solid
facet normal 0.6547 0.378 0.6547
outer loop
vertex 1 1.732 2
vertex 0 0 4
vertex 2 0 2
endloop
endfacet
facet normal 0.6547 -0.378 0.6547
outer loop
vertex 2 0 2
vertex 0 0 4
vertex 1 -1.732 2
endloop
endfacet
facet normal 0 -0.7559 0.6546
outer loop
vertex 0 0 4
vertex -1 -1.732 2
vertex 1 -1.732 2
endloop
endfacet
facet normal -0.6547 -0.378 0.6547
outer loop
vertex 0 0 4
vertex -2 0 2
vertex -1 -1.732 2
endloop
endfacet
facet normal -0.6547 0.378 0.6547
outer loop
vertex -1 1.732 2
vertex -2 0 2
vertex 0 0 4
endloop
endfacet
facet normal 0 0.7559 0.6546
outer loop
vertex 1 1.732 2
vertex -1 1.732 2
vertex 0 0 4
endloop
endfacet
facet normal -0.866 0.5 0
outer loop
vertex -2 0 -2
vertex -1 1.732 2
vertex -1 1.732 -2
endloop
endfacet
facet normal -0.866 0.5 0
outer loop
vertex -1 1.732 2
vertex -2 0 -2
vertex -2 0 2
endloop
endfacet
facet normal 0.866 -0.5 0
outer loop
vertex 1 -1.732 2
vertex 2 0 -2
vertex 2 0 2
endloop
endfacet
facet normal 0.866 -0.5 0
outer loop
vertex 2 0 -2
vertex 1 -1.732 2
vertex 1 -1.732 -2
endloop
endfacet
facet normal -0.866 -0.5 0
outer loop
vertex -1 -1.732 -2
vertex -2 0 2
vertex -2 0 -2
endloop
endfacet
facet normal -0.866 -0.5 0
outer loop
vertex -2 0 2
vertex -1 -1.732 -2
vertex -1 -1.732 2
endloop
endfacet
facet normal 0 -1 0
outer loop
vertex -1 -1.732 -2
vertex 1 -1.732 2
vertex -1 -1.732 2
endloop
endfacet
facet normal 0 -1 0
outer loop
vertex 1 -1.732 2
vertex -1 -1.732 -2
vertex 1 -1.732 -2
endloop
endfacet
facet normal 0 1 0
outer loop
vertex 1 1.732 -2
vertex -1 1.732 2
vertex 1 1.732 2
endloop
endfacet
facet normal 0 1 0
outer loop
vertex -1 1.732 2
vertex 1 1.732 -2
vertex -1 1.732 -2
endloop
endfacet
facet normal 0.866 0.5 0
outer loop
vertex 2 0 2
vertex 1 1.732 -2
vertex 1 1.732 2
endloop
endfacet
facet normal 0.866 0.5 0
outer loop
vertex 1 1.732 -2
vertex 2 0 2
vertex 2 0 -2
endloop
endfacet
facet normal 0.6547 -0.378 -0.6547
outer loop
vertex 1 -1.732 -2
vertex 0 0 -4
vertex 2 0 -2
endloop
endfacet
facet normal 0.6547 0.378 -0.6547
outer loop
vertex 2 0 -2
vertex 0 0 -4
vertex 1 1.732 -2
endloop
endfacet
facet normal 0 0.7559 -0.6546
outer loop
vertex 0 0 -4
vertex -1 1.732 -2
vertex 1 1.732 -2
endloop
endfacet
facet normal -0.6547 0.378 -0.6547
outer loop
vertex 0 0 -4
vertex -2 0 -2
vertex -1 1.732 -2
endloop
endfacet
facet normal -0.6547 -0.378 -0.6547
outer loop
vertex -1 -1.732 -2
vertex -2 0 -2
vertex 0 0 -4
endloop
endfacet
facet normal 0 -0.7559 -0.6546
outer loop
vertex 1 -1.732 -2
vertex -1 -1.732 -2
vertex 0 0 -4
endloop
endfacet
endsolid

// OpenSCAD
/*
Modular prism with fake blur. Very fake blur. Extremely fake blur.
*/

prism_sides=6;
base_radius=1;
prism_height=2;
tips_height=1;
prism_twist=0;
prism_color=[0,0.5,1];
// Detail of curved surfaces: 1 face per corner
$fa=1;

module regular_polygon(order=4, r=1){
  angles=[ for (i = [0:order-1]) i*(360/order) ];
  coords=[ for (th=angles) [r*cos(th), r*sin(th)] ];
  polygon(coords);
}

module prism(fake_blur=false) {
  color(prism_color)
  render(convexity=10){
    // Top tip
    rotate([0,0,-prism_twist])
    translate([0,0,prism_height/2])
    linear_extrude(height=tips_height,center=false,convexity=0,twist=prism_twist*(tips_height/prism_height),slices=100,scale=0)
    regular_polygon(order=prism_sides, r=base_radius);

    // Prism
    if (prism_height > 0){
      linear_extrude(height=prism_height,center=true,convexity=0,twist=prism_twist,slices=100,scale=1)
      regular_polygon(order=prism_sides, r=base_radius);
    }

    // Bottom tip
    translate([0,0,-prism_height/2]) rotate([180,0,0])
    linear_extrude(height=tips_height,center=false,convexity=0,twist=prism_twist*(tips_height/prism_height),slices=100,scale=0)
    regular_polygon(order=prism_sides, r=base_radius);
  }
  
  // Extremely fake blur
  if (fake_blur==true) {
    for(index = [1:1:10]) {
      color(prism_color, alpha=0.040-index/1000) scale([index/10+1,index/10+1,index/10+1]) prism(fake_blur=false);
    }
  }
}

prism(fake_blur=true);
